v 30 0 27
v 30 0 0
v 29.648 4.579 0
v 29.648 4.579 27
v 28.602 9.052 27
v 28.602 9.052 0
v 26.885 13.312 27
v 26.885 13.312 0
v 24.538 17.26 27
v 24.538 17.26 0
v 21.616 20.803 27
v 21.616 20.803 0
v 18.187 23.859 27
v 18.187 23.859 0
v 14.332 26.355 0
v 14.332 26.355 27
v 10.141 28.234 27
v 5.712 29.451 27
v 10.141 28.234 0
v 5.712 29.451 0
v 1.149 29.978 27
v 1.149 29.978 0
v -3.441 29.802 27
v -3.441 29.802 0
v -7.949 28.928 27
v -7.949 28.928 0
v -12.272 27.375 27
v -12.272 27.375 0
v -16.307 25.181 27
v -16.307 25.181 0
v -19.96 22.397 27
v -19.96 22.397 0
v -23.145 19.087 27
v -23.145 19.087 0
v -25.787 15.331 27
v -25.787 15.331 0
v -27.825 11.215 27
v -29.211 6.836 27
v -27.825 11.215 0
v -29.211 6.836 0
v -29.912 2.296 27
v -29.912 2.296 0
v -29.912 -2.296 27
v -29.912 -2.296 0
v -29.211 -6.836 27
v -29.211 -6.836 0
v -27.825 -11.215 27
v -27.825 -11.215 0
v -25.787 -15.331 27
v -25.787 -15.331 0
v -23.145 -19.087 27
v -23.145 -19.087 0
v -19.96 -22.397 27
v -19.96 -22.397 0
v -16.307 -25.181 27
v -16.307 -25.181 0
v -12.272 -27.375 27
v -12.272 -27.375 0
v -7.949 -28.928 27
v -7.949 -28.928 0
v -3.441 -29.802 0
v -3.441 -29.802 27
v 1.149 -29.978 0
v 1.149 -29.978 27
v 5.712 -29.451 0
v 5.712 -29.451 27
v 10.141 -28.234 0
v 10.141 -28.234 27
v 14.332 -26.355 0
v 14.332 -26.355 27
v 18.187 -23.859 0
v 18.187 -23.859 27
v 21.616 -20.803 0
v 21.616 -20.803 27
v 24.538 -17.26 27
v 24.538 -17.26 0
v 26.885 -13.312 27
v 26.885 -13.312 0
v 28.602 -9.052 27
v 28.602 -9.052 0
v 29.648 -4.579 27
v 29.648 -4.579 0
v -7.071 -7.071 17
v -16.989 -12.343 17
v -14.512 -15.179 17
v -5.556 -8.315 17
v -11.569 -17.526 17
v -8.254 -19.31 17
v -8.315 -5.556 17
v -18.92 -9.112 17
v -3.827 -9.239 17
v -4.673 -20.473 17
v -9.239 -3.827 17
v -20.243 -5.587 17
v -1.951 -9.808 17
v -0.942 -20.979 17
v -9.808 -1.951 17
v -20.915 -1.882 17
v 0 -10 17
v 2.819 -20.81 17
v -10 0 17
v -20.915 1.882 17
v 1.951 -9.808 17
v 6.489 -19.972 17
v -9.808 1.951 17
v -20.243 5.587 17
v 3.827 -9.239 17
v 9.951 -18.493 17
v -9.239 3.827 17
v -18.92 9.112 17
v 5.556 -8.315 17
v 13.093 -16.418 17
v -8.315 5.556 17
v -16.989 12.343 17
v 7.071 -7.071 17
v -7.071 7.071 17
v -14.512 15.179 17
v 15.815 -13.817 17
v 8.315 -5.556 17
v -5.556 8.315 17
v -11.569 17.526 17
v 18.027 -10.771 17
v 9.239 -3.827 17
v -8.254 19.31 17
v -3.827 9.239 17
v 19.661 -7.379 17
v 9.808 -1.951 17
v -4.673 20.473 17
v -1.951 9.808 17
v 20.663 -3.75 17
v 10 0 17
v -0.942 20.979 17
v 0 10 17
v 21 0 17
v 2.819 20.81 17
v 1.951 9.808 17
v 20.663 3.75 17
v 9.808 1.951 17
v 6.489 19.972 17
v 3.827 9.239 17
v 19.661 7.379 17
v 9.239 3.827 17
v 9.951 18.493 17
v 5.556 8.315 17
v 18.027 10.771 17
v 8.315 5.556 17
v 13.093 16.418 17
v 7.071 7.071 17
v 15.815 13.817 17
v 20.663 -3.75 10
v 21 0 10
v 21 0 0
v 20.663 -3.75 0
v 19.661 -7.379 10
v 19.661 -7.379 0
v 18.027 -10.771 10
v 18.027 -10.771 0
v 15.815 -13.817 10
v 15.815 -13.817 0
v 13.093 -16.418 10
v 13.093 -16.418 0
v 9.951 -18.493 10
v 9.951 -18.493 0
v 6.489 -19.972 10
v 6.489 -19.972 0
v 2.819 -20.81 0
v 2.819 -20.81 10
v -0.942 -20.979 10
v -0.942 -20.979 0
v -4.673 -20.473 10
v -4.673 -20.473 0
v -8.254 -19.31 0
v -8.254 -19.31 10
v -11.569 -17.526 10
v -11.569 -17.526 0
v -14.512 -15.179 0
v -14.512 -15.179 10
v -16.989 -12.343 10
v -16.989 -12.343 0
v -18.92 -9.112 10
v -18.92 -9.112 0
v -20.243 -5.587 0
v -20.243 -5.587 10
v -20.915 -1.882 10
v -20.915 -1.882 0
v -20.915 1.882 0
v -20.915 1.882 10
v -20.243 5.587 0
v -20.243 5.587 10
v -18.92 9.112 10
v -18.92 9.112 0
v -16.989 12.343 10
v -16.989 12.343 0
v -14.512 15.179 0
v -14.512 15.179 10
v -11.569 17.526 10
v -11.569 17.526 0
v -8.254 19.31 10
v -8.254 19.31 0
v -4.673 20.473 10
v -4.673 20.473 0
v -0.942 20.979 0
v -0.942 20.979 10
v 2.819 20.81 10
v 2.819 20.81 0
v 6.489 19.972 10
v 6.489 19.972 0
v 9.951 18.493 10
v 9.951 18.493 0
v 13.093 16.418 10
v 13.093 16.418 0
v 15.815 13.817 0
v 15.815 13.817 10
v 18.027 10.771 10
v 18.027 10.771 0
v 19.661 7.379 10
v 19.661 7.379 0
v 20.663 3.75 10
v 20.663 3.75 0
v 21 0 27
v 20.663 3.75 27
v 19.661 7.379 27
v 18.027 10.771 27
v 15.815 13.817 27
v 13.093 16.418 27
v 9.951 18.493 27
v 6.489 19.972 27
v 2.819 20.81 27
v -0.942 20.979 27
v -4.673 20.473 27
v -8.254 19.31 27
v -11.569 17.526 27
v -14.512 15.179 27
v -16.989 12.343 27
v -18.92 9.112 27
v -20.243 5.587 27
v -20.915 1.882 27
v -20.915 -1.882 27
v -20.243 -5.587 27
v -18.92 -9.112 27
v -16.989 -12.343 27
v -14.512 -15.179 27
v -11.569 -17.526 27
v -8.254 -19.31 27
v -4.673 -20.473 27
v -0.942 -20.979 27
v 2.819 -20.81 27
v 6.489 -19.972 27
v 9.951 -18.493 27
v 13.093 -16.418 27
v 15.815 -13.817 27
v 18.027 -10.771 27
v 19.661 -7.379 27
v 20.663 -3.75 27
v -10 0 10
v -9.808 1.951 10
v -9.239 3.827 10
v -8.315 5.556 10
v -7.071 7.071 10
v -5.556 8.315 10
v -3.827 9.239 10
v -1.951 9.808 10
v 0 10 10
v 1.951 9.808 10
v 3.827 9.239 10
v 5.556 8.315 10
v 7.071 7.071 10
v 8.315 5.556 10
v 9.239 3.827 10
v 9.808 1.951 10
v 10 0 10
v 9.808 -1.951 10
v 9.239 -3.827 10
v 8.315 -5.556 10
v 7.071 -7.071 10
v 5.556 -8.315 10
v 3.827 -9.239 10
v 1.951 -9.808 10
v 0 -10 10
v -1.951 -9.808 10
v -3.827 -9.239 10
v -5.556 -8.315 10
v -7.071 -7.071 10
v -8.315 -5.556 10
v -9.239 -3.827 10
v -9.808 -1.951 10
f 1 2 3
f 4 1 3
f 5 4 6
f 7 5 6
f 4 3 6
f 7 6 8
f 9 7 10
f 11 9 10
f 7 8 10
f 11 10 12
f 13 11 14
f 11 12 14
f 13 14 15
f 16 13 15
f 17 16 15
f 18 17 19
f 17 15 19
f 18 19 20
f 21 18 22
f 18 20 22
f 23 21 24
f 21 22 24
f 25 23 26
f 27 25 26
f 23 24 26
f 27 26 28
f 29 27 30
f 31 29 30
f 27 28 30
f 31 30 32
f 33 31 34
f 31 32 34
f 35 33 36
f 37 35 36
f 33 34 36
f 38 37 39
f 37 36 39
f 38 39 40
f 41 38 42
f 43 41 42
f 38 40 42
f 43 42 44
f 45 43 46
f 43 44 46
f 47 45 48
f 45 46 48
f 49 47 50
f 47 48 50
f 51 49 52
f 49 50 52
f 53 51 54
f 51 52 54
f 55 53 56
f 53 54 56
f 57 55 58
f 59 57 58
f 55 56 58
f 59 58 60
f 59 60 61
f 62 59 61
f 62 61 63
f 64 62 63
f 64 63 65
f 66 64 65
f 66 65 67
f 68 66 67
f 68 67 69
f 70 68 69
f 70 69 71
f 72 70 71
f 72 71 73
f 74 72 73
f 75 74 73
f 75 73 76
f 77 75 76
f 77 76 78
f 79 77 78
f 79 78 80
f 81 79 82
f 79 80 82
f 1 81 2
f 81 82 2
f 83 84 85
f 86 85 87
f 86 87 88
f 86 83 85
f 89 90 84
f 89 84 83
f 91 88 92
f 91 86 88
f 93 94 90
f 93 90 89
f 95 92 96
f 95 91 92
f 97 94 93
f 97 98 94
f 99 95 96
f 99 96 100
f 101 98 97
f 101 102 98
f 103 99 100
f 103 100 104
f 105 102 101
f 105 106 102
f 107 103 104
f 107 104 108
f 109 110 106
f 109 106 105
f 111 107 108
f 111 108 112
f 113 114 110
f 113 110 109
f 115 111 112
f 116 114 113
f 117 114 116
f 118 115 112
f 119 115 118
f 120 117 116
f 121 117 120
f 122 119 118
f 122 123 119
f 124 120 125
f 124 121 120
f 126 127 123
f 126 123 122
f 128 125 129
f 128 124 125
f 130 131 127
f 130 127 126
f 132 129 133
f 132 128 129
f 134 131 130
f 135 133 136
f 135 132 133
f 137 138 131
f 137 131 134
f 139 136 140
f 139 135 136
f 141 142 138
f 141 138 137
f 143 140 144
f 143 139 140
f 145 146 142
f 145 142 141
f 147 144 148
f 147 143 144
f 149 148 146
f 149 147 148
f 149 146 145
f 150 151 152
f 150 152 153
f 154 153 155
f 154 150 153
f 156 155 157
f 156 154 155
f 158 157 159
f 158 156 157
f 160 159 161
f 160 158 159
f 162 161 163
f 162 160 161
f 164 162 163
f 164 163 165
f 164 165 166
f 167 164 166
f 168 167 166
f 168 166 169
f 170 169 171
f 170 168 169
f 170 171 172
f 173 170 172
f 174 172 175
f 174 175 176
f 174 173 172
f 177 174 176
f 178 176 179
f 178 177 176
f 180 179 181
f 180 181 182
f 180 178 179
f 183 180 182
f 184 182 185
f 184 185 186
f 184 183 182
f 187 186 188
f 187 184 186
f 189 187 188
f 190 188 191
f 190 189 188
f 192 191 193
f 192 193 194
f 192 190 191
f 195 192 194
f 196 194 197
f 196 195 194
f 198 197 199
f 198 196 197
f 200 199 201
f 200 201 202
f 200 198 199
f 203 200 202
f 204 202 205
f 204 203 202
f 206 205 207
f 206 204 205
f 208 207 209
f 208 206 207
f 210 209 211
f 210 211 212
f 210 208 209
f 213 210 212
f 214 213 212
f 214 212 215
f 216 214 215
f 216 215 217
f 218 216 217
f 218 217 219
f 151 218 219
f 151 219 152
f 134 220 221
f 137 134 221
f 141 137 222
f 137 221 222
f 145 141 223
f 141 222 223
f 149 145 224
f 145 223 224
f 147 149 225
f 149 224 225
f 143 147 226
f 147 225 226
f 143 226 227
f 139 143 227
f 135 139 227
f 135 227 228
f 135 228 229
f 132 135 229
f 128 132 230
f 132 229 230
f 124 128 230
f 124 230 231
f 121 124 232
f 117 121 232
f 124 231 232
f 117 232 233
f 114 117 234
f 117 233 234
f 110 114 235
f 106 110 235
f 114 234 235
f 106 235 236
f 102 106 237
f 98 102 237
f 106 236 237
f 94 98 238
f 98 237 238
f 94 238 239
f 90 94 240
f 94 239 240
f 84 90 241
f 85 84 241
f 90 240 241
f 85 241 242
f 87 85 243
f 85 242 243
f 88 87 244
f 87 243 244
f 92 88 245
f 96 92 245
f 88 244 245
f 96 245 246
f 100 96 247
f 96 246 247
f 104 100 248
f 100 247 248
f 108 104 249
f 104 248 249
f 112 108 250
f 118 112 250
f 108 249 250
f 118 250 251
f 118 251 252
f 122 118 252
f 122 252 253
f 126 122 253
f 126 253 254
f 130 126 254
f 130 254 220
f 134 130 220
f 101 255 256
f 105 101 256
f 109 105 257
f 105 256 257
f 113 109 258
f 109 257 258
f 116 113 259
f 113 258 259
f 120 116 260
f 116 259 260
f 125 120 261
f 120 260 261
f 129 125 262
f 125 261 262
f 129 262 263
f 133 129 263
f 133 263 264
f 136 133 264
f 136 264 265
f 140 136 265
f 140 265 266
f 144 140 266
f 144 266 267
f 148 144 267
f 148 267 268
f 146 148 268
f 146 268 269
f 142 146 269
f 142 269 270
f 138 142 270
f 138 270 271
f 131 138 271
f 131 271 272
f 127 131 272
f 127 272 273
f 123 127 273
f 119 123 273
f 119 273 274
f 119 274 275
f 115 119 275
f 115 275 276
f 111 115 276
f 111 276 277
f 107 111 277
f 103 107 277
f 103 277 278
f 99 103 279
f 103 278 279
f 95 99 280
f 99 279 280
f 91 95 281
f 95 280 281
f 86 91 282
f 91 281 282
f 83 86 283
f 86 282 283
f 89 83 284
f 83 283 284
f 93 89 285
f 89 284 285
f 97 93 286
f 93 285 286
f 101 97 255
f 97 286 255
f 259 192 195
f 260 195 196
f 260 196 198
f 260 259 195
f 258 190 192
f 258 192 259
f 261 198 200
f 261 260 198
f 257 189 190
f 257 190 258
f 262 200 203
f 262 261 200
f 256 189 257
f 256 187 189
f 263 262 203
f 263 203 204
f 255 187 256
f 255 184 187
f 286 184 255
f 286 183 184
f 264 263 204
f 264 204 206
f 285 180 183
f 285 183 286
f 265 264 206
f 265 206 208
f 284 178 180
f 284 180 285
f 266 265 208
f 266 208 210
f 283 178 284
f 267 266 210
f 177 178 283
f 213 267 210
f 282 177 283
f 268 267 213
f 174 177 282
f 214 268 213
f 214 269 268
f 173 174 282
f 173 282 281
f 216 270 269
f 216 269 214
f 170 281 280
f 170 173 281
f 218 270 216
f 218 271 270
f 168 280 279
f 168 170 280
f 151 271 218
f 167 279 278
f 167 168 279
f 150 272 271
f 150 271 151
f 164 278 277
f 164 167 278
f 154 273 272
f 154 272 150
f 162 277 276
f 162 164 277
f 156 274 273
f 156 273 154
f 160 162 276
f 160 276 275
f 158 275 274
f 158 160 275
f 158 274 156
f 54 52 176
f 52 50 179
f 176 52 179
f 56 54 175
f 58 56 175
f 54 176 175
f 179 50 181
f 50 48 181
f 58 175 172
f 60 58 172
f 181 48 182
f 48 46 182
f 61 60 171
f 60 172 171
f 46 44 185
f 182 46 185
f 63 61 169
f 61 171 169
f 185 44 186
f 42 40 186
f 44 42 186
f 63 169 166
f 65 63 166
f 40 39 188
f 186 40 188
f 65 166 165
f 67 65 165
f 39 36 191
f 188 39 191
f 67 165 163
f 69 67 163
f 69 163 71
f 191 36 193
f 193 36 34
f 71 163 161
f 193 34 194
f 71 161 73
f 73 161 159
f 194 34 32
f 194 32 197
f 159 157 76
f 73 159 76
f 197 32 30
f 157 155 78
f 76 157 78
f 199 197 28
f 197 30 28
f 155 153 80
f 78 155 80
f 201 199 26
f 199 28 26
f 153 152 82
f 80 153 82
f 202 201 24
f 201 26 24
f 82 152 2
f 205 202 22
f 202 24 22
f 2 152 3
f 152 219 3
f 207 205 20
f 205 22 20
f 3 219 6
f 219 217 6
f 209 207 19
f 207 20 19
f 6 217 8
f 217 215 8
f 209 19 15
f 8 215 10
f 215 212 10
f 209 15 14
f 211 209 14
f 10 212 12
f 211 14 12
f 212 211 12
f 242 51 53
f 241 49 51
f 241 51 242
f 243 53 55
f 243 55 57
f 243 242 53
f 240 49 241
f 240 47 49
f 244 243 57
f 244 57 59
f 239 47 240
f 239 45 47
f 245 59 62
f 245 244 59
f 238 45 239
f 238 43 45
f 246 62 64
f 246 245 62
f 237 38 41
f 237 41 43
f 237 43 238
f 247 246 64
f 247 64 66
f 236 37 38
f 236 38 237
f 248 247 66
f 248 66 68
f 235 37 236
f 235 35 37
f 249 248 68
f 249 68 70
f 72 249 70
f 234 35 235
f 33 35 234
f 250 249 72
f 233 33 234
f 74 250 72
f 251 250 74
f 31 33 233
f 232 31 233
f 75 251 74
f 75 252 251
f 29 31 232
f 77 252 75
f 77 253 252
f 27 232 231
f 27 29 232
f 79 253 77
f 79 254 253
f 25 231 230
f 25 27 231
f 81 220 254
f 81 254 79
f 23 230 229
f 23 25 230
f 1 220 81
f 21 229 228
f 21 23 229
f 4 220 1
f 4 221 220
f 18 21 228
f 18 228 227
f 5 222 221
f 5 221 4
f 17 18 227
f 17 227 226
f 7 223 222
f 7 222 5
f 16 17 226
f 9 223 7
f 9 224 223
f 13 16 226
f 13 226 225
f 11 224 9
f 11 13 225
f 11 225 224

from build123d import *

# Parameters (mm, degrees)
ESQUISSE1_R             = 30
BOSS_EXTRU_1_DEPTH      = 27
ESQUISSE3_R             = 21
ENL_V_MAT_EXTRU_1_DEPTH = 10
ENL_V_START             = -10
ESQUISSE4_R             = 21
ENL_V_MAT_EXTRU_2_DEPTH = 10
ESQUISSE5_R             = 10
ENL_V_MAT_EXTRU_3_DEPTH = 10


with BuildPart() as part:
    # Esquisse1 → Boss.-Extru.1 (new body)
    with BuildSketch(Plane.XY):
        Circle(ESQUISSE1_R)
    extrude(amount=BOSS_EXTRU_1_DEPTH)

    # Esquisse3 → Enlèv. mat.-Extru.1 (cut)
    with BuildSketch(Plane.XY.offset(27)):
        Circle(ESQUISSE3_R)
    extrude(amount=-ENL_V_MAT_EXTRU_1_DEPTH, mode=Mode.SUBTRACT)

    # Esquisse4 → Enlèv. mat.-Extru.2 (cut)
    with BuildSketch(Plane(origin=(0, 0, 0), x_dir=(-1, 0, 0), z_dir=(0, 0, -1)).offset(ENL_V_START)):
        with Locations(Location((0, 0, 0), (0, 0, 180))):
            Circle(ESQUISSE4_R)
    extrude(amount=ENL_V_MAT_EXTRU_2_DEPTH, mode=Mode.SUBTRACT)

    # Esquisse5 → Enlèv. mat.-Extru.3 (cut)
    with BuildSketch(Plane(origin=(0, 0, 10), x_dir=(-1, 0, 0), z_dir=(0, 0, -1))):
        Circle(ESQUISSE5_R)
    extrude(amount=-ENL_V_MAT_EXTRU_3_DEPTH, mode=Mode.SUBTRACT)


solid = part.part
